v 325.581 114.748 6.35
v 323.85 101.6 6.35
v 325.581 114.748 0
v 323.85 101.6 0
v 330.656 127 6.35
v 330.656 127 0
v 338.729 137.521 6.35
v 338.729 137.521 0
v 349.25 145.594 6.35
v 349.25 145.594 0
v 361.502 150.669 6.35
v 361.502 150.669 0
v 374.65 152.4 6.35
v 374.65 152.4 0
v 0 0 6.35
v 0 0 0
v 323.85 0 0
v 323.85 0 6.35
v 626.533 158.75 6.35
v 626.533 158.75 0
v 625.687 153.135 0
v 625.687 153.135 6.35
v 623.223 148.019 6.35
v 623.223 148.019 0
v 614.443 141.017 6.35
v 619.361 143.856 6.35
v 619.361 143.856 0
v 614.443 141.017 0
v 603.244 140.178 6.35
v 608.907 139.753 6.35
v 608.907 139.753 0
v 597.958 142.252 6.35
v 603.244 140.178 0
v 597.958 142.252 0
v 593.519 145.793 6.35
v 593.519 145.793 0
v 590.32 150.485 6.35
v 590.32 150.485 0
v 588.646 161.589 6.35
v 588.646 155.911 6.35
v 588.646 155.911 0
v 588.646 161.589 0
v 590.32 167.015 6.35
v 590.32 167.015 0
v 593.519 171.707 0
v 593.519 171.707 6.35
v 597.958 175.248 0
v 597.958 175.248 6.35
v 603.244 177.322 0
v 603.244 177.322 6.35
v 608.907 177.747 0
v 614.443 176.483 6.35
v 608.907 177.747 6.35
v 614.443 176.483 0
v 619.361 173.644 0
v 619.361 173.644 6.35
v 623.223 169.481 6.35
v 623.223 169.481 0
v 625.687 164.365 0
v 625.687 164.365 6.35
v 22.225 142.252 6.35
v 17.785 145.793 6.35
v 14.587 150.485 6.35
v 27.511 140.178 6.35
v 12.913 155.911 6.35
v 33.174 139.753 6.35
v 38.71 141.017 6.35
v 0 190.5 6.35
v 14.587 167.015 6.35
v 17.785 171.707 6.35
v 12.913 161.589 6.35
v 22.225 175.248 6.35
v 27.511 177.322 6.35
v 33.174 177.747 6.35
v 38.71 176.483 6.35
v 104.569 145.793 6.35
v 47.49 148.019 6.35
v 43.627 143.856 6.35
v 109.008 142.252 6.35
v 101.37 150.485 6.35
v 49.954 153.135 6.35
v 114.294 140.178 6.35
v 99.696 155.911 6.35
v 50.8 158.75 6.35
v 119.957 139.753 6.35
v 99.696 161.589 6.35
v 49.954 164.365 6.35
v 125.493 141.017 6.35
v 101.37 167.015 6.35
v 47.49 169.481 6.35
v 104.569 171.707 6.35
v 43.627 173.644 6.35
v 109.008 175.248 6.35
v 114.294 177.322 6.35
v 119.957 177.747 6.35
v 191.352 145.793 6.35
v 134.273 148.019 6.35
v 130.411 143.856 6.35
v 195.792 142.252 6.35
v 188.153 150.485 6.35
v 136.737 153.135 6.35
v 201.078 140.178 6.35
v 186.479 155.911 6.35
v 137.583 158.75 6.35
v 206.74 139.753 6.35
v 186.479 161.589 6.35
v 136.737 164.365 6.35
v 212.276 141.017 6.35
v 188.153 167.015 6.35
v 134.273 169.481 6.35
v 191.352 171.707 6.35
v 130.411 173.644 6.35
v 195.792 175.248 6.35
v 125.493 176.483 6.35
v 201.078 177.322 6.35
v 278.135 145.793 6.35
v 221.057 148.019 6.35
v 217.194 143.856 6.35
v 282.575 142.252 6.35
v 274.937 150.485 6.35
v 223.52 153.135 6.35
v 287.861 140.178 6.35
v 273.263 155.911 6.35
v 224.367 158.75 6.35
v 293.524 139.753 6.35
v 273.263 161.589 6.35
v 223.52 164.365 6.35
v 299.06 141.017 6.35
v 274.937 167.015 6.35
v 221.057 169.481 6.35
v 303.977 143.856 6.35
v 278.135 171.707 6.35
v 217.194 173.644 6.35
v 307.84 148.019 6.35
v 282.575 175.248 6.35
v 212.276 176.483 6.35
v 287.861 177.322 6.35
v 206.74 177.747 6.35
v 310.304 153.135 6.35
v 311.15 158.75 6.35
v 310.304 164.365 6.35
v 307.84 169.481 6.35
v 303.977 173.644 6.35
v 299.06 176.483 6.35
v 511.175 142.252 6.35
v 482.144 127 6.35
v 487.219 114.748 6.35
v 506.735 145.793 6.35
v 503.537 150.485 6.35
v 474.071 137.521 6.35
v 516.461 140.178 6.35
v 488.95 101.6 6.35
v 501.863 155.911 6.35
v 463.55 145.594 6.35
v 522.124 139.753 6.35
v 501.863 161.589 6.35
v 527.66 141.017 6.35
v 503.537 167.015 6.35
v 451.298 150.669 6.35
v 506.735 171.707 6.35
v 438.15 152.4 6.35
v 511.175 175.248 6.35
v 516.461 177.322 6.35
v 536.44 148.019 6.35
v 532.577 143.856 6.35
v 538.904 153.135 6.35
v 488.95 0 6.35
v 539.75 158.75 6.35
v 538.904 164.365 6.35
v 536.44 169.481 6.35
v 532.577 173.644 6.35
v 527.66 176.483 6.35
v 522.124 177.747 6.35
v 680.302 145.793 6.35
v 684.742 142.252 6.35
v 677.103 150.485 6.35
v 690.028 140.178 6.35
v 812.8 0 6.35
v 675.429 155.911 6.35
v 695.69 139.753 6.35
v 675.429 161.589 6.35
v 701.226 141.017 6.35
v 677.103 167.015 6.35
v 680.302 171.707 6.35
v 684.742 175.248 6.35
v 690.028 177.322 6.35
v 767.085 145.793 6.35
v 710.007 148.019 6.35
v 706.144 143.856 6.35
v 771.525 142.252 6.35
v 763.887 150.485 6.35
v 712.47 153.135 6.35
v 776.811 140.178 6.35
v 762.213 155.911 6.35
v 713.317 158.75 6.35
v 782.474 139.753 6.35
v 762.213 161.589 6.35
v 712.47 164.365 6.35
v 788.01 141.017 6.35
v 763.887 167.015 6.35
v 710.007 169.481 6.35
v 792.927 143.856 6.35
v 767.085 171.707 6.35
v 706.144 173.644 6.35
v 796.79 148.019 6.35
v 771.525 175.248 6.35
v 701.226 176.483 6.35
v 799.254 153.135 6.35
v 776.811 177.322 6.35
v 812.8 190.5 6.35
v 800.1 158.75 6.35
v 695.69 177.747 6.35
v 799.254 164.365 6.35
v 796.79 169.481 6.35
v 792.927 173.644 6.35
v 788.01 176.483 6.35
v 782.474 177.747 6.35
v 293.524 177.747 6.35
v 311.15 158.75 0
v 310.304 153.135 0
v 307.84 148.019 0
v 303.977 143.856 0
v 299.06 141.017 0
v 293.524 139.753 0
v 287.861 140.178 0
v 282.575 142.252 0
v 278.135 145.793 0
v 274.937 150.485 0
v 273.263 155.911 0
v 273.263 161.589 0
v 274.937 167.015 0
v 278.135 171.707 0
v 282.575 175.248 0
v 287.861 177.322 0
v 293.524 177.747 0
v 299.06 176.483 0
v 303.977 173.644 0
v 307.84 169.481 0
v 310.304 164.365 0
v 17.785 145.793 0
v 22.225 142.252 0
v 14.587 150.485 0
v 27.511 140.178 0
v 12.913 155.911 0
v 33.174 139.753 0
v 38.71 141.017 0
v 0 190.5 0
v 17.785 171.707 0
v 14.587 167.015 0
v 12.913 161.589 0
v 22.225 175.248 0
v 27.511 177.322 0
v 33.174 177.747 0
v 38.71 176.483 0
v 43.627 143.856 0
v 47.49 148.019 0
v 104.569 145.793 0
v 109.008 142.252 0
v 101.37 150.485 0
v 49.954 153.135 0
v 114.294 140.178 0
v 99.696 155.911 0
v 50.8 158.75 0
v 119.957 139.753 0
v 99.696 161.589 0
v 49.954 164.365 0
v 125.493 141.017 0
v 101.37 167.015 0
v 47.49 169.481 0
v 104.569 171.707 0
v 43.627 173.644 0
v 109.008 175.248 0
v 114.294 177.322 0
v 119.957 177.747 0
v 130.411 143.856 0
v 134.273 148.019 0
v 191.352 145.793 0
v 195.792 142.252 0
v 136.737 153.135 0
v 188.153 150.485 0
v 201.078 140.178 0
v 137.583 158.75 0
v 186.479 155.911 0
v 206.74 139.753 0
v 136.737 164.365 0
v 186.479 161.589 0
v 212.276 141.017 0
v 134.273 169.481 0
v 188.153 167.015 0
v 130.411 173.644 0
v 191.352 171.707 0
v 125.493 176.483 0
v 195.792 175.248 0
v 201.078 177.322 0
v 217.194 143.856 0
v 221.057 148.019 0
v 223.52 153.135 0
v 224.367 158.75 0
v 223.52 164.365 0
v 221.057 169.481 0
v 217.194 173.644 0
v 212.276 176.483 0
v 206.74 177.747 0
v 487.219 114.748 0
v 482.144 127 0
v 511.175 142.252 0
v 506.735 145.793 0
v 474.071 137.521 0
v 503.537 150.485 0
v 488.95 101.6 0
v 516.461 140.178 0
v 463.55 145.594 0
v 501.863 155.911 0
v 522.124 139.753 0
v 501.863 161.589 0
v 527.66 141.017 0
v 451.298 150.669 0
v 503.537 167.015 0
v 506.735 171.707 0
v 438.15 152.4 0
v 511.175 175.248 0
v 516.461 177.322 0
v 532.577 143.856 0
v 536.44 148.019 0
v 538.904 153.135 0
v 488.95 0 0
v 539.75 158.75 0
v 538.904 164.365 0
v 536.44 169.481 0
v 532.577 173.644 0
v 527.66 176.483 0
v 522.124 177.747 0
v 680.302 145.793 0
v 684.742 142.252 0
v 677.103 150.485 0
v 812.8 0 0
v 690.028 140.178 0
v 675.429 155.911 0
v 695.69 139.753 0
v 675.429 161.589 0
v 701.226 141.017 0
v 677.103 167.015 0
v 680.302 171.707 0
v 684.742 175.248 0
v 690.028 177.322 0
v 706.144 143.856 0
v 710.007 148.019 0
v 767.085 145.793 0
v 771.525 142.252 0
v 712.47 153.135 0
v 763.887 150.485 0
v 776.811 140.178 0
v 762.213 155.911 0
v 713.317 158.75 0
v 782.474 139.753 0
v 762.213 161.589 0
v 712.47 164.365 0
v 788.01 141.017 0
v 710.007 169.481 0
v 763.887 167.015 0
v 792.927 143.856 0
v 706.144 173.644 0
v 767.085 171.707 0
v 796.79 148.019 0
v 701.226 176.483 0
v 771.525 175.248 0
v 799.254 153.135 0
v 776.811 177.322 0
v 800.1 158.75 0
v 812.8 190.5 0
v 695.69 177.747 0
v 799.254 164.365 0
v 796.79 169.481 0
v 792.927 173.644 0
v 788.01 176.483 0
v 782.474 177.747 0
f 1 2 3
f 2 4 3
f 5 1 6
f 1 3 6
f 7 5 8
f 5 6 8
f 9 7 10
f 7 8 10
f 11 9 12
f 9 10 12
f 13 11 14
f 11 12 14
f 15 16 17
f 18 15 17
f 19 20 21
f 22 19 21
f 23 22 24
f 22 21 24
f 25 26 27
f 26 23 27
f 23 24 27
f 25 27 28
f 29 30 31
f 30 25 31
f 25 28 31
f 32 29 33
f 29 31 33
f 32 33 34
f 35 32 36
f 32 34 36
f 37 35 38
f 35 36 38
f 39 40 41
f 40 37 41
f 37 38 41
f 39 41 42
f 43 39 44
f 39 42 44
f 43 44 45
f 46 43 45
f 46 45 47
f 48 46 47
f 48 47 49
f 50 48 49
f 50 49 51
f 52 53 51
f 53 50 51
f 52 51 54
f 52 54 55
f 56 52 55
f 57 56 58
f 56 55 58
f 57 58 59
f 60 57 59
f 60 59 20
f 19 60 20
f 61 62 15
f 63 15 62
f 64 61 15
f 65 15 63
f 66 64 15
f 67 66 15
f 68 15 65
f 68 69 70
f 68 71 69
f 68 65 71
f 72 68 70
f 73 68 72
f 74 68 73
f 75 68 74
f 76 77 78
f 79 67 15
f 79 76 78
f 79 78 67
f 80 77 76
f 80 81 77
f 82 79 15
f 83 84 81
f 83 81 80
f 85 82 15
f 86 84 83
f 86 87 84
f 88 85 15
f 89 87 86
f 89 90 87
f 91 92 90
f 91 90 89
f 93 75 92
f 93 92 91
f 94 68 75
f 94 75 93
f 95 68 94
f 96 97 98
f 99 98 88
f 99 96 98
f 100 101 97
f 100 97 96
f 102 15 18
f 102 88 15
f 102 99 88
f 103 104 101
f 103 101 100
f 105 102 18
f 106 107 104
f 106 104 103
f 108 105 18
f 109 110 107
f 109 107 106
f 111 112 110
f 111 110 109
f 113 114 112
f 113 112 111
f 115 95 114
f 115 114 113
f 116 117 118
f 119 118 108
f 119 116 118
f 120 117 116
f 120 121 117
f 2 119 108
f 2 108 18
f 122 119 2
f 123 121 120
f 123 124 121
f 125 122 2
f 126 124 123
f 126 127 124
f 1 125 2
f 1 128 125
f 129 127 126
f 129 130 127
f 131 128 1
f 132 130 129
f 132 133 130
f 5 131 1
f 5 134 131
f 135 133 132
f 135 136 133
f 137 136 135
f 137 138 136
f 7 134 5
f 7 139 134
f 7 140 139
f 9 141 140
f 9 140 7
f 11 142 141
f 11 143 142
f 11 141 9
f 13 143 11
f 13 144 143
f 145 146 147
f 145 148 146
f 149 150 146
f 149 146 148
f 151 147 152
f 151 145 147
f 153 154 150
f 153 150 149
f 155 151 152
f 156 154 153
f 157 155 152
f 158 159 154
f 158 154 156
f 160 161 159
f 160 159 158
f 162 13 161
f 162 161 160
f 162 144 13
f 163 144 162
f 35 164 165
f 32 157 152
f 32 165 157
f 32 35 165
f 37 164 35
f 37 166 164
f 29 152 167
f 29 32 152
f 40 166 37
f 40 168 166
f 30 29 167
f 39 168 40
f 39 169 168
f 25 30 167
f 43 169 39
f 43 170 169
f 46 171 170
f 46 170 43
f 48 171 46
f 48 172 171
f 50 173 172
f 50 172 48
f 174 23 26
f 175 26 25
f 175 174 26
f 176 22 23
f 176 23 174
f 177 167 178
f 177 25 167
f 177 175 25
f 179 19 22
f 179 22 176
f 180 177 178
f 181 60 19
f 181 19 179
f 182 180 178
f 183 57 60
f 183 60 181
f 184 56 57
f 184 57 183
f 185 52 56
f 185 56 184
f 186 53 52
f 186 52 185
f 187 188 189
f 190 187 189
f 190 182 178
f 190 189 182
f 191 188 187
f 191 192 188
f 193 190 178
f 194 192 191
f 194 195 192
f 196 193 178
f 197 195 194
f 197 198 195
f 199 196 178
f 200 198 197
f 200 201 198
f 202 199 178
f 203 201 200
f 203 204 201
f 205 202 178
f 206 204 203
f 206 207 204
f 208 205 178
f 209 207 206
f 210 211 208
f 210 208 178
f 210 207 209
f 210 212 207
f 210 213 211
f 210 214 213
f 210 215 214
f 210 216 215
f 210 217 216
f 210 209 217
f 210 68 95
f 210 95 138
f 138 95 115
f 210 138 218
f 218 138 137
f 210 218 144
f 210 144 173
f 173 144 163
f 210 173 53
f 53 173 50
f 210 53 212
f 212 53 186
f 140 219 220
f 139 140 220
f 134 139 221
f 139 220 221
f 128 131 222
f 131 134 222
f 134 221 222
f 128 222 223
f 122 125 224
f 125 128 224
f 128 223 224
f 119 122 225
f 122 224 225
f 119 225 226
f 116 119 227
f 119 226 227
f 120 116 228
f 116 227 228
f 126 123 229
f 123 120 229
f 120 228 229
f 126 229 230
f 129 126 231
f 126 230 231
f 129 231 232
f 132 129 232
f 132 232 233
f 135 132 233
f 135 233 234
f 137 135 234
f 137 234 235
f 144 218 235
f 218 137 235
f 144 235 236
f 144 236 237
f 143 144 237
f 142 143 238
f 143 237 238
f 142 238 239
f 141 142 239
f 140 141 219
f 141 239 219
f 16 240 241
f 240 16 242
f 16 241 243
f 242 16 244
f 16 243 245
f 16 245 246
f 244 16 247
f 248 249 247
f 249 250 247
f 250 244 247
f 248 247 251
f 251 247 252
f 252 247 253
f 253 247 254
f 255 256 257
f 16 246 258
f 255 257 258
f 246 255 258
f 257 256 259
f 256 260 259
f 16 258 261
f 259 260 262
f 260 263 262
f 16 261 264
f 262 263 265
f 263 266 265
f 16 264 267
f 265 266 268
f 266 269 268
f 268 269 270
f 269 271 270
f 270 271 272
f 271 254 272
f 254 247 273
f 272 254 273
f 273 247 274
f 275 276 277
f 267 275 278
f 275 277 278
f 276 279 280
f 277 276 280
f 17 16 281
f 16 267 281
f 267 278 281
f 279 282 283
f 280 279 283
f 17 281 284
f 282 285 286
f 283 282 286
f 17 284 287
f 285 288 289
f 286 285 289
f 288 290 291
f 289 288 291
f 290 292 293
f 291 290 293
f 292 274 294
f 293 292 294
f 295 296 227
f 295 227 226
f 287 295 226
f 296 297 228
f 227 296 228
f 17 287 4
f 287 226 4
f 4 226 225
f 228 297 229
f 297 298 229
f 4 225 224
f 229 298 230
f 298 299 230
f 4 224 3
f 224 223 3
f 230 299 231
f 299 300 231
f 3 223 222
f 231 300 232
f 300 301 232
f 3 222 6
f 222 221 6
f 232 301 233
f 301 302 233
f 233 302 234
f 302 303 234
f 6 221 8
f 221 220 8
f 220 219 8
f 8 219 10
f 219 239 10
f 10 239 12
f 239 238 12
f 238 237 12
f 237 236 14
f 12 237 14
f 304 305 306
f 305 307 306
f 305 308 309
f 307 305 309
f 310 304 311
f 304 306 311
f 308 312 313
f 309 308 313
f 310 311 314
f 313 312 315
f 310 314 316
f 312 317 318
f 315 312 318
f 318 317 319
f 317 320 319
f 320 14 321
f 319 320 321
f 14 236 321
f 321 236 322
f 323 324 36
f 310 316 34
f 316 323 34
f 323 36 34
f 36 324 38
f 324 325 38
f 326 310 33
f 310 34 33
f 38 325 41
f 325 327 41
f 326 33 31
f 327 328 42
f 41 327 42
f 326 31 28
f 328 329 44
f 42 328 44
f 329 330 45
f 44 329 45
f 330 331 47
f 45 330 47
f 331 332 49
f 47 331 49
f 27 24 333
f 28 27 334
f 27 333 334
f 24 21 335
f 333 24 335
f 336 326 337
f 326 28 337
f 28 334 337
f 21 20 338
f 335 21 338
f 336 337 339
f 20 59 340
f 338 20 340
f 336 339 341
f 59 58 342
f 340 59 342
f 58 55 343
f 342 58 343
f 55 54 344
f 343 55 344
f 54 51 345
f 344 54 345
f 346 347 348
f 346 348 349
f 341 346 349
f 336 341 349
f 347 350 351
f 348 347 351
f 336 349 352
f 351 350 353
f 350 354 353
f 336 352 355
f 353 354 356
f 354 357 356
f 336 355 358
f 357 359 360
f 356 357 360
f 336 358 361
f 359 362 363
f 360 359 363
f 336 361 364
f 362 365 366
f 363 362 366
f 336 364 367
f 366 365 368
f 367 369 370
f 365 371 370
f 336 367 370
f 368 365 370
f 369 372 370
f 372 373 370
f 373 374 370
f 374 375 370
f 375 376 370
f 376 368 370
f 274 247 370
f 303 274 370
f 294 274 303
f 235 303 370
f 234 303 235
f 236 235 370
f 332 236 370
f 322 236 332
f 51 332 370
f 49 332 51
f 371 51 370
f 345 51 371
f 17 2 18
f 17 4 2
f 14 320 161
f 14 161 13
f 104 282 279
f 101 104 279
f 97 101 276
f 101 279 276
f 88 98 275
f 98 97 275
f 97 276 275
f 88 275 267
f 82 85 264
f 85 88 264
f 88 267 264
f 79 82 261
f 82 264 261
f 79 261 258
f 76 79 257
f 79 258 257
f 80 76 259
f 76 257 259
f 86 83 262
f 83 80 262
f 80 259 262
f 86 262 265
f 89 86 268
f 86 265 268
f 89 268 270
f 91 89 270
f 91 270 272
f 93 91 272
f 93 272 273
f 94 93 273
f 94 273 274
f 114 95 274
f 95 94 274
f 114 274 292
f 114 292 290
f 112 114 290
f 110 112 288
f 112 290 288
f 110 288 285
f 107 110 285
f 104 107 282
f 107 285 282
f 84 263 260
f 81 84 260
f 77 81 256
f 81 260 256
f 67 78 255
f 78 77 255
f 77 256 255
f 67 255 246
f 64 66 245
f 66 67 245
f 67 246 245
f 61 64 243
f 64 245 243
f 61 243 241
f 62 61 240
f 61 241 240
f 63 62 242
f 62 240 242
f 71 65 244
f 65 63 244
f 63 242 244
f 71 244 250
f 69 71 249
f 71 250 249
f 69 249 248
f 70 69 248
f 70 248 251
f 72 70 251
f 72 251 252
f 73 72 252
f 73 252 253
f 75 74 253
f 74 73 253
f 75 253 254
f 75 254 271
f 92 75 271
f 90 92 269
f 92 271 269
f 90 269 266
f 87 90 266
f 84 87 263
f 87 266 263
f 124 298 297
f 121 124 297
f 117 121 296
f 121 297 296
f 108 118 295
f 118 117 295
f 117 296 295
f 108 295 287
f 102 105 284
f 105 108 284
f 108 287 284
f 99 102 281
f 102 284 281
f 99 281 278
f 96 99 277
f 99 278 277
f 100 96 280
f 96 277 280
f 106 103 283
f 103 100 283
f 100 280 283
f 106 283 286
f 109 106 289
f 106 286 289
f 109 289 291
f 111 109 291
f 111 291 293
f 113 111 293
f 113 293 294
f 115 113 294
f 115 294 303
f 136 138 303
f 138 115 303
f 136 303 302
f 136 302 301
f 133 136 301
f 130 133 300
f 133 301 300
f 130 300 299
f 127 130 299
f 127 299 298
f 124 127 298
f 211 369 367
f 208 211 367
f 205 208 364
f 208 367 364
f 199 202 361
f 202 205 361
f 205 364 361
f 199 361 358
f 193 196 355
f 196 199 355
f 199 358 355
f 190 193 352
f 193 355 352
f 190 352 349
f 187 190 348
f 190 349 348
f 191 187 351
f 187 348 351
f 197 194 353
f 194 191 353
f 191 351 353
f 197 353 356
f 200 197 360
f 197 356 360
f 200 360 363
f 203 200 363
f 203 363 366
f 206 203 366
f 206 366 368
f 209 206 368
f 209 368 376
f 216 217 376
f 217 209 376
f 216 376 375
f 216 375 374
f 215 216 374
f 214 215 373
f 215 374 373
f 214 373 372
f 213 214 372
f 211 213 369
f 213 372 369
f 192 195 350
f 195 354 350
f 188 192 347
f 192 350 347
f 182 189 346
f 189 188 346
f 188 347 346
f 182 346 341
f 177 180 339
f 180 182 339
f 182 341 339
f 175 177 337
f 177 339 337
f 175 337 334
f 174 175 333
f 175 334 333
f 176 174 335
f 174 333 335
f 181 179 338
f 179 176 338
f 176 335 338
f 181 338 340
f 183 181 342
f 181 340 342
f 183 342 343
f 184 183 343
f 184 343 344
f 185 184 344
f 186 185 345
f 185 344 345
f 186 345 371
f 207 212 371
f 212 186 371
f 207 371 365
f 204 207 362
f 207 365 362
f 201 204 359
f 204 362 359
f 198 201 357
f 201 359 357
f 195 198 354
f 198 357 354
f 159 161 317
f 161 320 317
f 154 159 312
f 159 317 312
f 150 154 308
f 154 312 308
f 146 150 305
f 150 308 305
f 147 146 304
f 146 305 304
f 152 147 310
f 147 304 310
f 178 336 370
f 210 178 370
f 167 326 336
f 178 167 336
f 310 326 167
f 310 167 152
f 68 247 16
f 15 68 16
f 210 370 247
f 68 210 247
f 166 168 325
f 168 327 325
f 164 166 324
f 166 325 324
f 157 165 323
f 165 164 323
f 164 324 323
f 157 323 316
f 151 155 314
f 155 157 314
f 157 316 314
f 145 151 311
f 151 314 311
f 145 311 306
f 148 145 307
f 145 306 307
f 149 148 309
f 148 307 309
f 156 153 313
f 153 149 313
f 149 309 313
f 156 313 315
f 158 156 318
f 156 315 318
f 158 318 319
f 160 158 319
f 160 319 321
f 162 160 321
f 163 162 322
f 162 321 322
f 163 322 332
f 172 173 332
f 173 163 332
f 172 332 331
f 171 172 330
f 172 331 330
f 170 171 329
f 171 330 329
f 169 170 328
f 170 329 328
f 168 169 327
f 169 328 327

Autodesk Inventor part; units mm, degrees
ref_plane "YZ Plane" through (0, 0, 0) normal (1, 0, 0) x (0, 1, 0)
ref_plane "XZ Plane" through (0, 0, 0) normal (0, 1, 0) x (-1, 0, 0)
ref_plane "XY Plane" through (0, 0, 0) normal (0, 0, 1) x (1, 0, 0)
sketch "Sketch1" plane through (0, 0, 0) normal (0, 0, 1) x (1, 0, 0)
  line L0 (812.8, 0) -> (812.8, 190.5)
  line L1 (812.8, 190.5) -> (0, 190.5)
  line L2 (0, 190.5) -> (0, 0)
  circle A0 centre (781.05, 158.75) radius 19.05
  circle A1 centre (520.7, 158.75) radius 19.05
  circle A2 centre (292.1, 158.75) radius 19.05
  circle A3 centre (31.75, 158.75) radius 19.05
  circle A4 centre (694.2667, 158.75) radius 19.05
  circle A5 centre (205.3167, 158.75) radius 19.05
  circle A6 centre (607.4833, 158.75) radius 19.05
  circle A7 centre (118.5333, 158.75) radius 19.05
  line L3 (488.95, 0) -> (488.95, 101.6)
  line L4 (488.95, 152.4) -> (438.15, 152.4) construction
  line L5 (323.85, 152.4) -> (323.85, 101.6) construction
  line L6 (0, 0) -> (323.85, 0)
  line L7 (488.95, 0) -> (812.8, 0)
  arc A8 (374.65, 152.4) -> (323.85, 101.6) centre (374.65, 101.6) ccw
  arc A9 (488.95, 101.6) -> (438.15, 152.4) centre (438.15, 101.6) ccw
  line L8 (374.65, 152.4) -> (323.85, 152.4) construction
  line L9 (323.85, 101.6) -> (323.85, 0)
  line L10 (438.15, 152.4) -> (374.65, 152.4)
  line L11 (488.95, 101.6) -> (488.95, 152.4) construction
  dimension "d0" = 190.5
  dimension "d1" = 812.8
  dimension "d13" = 38.1
  dimension "d14" = 38.1
  dimension "d15" = 228.6
  dimension "d16" = 260.35
  dimension "d17" = 86.7833
  dimension "d18" = 86.7833
  dimension "d21" = 31.75
  dimension "d22" = 31.75
  dimension "d23" = 31.75
  dimension "d24" = 86.7833
  dimension "d25" = 86.7833
  dimension "d26" = 165.1
  dimension "d28" = 323.85
  dimension "d29" = 152.4
  dimension "d30" = 50.8
extrude "Extrusion1" add sketch "Sketch1" along normal blind 6.35
equation "\"d14\" = d13"
equation "\"d16\" = 0.5 * d1 - 0.5 * d15 - d23"
equation "\"d17\" = 0.333333 * d16"
equation "\"d18\" = d17"
equation "\"d23\" = d22"
equation "\"d24\" = d17"
equation "\"d25\" = d18"
equation "\"d28\" = -0.5 * d26 + 0.5 * d1"
properties part number "manipulator back pannel 2"
